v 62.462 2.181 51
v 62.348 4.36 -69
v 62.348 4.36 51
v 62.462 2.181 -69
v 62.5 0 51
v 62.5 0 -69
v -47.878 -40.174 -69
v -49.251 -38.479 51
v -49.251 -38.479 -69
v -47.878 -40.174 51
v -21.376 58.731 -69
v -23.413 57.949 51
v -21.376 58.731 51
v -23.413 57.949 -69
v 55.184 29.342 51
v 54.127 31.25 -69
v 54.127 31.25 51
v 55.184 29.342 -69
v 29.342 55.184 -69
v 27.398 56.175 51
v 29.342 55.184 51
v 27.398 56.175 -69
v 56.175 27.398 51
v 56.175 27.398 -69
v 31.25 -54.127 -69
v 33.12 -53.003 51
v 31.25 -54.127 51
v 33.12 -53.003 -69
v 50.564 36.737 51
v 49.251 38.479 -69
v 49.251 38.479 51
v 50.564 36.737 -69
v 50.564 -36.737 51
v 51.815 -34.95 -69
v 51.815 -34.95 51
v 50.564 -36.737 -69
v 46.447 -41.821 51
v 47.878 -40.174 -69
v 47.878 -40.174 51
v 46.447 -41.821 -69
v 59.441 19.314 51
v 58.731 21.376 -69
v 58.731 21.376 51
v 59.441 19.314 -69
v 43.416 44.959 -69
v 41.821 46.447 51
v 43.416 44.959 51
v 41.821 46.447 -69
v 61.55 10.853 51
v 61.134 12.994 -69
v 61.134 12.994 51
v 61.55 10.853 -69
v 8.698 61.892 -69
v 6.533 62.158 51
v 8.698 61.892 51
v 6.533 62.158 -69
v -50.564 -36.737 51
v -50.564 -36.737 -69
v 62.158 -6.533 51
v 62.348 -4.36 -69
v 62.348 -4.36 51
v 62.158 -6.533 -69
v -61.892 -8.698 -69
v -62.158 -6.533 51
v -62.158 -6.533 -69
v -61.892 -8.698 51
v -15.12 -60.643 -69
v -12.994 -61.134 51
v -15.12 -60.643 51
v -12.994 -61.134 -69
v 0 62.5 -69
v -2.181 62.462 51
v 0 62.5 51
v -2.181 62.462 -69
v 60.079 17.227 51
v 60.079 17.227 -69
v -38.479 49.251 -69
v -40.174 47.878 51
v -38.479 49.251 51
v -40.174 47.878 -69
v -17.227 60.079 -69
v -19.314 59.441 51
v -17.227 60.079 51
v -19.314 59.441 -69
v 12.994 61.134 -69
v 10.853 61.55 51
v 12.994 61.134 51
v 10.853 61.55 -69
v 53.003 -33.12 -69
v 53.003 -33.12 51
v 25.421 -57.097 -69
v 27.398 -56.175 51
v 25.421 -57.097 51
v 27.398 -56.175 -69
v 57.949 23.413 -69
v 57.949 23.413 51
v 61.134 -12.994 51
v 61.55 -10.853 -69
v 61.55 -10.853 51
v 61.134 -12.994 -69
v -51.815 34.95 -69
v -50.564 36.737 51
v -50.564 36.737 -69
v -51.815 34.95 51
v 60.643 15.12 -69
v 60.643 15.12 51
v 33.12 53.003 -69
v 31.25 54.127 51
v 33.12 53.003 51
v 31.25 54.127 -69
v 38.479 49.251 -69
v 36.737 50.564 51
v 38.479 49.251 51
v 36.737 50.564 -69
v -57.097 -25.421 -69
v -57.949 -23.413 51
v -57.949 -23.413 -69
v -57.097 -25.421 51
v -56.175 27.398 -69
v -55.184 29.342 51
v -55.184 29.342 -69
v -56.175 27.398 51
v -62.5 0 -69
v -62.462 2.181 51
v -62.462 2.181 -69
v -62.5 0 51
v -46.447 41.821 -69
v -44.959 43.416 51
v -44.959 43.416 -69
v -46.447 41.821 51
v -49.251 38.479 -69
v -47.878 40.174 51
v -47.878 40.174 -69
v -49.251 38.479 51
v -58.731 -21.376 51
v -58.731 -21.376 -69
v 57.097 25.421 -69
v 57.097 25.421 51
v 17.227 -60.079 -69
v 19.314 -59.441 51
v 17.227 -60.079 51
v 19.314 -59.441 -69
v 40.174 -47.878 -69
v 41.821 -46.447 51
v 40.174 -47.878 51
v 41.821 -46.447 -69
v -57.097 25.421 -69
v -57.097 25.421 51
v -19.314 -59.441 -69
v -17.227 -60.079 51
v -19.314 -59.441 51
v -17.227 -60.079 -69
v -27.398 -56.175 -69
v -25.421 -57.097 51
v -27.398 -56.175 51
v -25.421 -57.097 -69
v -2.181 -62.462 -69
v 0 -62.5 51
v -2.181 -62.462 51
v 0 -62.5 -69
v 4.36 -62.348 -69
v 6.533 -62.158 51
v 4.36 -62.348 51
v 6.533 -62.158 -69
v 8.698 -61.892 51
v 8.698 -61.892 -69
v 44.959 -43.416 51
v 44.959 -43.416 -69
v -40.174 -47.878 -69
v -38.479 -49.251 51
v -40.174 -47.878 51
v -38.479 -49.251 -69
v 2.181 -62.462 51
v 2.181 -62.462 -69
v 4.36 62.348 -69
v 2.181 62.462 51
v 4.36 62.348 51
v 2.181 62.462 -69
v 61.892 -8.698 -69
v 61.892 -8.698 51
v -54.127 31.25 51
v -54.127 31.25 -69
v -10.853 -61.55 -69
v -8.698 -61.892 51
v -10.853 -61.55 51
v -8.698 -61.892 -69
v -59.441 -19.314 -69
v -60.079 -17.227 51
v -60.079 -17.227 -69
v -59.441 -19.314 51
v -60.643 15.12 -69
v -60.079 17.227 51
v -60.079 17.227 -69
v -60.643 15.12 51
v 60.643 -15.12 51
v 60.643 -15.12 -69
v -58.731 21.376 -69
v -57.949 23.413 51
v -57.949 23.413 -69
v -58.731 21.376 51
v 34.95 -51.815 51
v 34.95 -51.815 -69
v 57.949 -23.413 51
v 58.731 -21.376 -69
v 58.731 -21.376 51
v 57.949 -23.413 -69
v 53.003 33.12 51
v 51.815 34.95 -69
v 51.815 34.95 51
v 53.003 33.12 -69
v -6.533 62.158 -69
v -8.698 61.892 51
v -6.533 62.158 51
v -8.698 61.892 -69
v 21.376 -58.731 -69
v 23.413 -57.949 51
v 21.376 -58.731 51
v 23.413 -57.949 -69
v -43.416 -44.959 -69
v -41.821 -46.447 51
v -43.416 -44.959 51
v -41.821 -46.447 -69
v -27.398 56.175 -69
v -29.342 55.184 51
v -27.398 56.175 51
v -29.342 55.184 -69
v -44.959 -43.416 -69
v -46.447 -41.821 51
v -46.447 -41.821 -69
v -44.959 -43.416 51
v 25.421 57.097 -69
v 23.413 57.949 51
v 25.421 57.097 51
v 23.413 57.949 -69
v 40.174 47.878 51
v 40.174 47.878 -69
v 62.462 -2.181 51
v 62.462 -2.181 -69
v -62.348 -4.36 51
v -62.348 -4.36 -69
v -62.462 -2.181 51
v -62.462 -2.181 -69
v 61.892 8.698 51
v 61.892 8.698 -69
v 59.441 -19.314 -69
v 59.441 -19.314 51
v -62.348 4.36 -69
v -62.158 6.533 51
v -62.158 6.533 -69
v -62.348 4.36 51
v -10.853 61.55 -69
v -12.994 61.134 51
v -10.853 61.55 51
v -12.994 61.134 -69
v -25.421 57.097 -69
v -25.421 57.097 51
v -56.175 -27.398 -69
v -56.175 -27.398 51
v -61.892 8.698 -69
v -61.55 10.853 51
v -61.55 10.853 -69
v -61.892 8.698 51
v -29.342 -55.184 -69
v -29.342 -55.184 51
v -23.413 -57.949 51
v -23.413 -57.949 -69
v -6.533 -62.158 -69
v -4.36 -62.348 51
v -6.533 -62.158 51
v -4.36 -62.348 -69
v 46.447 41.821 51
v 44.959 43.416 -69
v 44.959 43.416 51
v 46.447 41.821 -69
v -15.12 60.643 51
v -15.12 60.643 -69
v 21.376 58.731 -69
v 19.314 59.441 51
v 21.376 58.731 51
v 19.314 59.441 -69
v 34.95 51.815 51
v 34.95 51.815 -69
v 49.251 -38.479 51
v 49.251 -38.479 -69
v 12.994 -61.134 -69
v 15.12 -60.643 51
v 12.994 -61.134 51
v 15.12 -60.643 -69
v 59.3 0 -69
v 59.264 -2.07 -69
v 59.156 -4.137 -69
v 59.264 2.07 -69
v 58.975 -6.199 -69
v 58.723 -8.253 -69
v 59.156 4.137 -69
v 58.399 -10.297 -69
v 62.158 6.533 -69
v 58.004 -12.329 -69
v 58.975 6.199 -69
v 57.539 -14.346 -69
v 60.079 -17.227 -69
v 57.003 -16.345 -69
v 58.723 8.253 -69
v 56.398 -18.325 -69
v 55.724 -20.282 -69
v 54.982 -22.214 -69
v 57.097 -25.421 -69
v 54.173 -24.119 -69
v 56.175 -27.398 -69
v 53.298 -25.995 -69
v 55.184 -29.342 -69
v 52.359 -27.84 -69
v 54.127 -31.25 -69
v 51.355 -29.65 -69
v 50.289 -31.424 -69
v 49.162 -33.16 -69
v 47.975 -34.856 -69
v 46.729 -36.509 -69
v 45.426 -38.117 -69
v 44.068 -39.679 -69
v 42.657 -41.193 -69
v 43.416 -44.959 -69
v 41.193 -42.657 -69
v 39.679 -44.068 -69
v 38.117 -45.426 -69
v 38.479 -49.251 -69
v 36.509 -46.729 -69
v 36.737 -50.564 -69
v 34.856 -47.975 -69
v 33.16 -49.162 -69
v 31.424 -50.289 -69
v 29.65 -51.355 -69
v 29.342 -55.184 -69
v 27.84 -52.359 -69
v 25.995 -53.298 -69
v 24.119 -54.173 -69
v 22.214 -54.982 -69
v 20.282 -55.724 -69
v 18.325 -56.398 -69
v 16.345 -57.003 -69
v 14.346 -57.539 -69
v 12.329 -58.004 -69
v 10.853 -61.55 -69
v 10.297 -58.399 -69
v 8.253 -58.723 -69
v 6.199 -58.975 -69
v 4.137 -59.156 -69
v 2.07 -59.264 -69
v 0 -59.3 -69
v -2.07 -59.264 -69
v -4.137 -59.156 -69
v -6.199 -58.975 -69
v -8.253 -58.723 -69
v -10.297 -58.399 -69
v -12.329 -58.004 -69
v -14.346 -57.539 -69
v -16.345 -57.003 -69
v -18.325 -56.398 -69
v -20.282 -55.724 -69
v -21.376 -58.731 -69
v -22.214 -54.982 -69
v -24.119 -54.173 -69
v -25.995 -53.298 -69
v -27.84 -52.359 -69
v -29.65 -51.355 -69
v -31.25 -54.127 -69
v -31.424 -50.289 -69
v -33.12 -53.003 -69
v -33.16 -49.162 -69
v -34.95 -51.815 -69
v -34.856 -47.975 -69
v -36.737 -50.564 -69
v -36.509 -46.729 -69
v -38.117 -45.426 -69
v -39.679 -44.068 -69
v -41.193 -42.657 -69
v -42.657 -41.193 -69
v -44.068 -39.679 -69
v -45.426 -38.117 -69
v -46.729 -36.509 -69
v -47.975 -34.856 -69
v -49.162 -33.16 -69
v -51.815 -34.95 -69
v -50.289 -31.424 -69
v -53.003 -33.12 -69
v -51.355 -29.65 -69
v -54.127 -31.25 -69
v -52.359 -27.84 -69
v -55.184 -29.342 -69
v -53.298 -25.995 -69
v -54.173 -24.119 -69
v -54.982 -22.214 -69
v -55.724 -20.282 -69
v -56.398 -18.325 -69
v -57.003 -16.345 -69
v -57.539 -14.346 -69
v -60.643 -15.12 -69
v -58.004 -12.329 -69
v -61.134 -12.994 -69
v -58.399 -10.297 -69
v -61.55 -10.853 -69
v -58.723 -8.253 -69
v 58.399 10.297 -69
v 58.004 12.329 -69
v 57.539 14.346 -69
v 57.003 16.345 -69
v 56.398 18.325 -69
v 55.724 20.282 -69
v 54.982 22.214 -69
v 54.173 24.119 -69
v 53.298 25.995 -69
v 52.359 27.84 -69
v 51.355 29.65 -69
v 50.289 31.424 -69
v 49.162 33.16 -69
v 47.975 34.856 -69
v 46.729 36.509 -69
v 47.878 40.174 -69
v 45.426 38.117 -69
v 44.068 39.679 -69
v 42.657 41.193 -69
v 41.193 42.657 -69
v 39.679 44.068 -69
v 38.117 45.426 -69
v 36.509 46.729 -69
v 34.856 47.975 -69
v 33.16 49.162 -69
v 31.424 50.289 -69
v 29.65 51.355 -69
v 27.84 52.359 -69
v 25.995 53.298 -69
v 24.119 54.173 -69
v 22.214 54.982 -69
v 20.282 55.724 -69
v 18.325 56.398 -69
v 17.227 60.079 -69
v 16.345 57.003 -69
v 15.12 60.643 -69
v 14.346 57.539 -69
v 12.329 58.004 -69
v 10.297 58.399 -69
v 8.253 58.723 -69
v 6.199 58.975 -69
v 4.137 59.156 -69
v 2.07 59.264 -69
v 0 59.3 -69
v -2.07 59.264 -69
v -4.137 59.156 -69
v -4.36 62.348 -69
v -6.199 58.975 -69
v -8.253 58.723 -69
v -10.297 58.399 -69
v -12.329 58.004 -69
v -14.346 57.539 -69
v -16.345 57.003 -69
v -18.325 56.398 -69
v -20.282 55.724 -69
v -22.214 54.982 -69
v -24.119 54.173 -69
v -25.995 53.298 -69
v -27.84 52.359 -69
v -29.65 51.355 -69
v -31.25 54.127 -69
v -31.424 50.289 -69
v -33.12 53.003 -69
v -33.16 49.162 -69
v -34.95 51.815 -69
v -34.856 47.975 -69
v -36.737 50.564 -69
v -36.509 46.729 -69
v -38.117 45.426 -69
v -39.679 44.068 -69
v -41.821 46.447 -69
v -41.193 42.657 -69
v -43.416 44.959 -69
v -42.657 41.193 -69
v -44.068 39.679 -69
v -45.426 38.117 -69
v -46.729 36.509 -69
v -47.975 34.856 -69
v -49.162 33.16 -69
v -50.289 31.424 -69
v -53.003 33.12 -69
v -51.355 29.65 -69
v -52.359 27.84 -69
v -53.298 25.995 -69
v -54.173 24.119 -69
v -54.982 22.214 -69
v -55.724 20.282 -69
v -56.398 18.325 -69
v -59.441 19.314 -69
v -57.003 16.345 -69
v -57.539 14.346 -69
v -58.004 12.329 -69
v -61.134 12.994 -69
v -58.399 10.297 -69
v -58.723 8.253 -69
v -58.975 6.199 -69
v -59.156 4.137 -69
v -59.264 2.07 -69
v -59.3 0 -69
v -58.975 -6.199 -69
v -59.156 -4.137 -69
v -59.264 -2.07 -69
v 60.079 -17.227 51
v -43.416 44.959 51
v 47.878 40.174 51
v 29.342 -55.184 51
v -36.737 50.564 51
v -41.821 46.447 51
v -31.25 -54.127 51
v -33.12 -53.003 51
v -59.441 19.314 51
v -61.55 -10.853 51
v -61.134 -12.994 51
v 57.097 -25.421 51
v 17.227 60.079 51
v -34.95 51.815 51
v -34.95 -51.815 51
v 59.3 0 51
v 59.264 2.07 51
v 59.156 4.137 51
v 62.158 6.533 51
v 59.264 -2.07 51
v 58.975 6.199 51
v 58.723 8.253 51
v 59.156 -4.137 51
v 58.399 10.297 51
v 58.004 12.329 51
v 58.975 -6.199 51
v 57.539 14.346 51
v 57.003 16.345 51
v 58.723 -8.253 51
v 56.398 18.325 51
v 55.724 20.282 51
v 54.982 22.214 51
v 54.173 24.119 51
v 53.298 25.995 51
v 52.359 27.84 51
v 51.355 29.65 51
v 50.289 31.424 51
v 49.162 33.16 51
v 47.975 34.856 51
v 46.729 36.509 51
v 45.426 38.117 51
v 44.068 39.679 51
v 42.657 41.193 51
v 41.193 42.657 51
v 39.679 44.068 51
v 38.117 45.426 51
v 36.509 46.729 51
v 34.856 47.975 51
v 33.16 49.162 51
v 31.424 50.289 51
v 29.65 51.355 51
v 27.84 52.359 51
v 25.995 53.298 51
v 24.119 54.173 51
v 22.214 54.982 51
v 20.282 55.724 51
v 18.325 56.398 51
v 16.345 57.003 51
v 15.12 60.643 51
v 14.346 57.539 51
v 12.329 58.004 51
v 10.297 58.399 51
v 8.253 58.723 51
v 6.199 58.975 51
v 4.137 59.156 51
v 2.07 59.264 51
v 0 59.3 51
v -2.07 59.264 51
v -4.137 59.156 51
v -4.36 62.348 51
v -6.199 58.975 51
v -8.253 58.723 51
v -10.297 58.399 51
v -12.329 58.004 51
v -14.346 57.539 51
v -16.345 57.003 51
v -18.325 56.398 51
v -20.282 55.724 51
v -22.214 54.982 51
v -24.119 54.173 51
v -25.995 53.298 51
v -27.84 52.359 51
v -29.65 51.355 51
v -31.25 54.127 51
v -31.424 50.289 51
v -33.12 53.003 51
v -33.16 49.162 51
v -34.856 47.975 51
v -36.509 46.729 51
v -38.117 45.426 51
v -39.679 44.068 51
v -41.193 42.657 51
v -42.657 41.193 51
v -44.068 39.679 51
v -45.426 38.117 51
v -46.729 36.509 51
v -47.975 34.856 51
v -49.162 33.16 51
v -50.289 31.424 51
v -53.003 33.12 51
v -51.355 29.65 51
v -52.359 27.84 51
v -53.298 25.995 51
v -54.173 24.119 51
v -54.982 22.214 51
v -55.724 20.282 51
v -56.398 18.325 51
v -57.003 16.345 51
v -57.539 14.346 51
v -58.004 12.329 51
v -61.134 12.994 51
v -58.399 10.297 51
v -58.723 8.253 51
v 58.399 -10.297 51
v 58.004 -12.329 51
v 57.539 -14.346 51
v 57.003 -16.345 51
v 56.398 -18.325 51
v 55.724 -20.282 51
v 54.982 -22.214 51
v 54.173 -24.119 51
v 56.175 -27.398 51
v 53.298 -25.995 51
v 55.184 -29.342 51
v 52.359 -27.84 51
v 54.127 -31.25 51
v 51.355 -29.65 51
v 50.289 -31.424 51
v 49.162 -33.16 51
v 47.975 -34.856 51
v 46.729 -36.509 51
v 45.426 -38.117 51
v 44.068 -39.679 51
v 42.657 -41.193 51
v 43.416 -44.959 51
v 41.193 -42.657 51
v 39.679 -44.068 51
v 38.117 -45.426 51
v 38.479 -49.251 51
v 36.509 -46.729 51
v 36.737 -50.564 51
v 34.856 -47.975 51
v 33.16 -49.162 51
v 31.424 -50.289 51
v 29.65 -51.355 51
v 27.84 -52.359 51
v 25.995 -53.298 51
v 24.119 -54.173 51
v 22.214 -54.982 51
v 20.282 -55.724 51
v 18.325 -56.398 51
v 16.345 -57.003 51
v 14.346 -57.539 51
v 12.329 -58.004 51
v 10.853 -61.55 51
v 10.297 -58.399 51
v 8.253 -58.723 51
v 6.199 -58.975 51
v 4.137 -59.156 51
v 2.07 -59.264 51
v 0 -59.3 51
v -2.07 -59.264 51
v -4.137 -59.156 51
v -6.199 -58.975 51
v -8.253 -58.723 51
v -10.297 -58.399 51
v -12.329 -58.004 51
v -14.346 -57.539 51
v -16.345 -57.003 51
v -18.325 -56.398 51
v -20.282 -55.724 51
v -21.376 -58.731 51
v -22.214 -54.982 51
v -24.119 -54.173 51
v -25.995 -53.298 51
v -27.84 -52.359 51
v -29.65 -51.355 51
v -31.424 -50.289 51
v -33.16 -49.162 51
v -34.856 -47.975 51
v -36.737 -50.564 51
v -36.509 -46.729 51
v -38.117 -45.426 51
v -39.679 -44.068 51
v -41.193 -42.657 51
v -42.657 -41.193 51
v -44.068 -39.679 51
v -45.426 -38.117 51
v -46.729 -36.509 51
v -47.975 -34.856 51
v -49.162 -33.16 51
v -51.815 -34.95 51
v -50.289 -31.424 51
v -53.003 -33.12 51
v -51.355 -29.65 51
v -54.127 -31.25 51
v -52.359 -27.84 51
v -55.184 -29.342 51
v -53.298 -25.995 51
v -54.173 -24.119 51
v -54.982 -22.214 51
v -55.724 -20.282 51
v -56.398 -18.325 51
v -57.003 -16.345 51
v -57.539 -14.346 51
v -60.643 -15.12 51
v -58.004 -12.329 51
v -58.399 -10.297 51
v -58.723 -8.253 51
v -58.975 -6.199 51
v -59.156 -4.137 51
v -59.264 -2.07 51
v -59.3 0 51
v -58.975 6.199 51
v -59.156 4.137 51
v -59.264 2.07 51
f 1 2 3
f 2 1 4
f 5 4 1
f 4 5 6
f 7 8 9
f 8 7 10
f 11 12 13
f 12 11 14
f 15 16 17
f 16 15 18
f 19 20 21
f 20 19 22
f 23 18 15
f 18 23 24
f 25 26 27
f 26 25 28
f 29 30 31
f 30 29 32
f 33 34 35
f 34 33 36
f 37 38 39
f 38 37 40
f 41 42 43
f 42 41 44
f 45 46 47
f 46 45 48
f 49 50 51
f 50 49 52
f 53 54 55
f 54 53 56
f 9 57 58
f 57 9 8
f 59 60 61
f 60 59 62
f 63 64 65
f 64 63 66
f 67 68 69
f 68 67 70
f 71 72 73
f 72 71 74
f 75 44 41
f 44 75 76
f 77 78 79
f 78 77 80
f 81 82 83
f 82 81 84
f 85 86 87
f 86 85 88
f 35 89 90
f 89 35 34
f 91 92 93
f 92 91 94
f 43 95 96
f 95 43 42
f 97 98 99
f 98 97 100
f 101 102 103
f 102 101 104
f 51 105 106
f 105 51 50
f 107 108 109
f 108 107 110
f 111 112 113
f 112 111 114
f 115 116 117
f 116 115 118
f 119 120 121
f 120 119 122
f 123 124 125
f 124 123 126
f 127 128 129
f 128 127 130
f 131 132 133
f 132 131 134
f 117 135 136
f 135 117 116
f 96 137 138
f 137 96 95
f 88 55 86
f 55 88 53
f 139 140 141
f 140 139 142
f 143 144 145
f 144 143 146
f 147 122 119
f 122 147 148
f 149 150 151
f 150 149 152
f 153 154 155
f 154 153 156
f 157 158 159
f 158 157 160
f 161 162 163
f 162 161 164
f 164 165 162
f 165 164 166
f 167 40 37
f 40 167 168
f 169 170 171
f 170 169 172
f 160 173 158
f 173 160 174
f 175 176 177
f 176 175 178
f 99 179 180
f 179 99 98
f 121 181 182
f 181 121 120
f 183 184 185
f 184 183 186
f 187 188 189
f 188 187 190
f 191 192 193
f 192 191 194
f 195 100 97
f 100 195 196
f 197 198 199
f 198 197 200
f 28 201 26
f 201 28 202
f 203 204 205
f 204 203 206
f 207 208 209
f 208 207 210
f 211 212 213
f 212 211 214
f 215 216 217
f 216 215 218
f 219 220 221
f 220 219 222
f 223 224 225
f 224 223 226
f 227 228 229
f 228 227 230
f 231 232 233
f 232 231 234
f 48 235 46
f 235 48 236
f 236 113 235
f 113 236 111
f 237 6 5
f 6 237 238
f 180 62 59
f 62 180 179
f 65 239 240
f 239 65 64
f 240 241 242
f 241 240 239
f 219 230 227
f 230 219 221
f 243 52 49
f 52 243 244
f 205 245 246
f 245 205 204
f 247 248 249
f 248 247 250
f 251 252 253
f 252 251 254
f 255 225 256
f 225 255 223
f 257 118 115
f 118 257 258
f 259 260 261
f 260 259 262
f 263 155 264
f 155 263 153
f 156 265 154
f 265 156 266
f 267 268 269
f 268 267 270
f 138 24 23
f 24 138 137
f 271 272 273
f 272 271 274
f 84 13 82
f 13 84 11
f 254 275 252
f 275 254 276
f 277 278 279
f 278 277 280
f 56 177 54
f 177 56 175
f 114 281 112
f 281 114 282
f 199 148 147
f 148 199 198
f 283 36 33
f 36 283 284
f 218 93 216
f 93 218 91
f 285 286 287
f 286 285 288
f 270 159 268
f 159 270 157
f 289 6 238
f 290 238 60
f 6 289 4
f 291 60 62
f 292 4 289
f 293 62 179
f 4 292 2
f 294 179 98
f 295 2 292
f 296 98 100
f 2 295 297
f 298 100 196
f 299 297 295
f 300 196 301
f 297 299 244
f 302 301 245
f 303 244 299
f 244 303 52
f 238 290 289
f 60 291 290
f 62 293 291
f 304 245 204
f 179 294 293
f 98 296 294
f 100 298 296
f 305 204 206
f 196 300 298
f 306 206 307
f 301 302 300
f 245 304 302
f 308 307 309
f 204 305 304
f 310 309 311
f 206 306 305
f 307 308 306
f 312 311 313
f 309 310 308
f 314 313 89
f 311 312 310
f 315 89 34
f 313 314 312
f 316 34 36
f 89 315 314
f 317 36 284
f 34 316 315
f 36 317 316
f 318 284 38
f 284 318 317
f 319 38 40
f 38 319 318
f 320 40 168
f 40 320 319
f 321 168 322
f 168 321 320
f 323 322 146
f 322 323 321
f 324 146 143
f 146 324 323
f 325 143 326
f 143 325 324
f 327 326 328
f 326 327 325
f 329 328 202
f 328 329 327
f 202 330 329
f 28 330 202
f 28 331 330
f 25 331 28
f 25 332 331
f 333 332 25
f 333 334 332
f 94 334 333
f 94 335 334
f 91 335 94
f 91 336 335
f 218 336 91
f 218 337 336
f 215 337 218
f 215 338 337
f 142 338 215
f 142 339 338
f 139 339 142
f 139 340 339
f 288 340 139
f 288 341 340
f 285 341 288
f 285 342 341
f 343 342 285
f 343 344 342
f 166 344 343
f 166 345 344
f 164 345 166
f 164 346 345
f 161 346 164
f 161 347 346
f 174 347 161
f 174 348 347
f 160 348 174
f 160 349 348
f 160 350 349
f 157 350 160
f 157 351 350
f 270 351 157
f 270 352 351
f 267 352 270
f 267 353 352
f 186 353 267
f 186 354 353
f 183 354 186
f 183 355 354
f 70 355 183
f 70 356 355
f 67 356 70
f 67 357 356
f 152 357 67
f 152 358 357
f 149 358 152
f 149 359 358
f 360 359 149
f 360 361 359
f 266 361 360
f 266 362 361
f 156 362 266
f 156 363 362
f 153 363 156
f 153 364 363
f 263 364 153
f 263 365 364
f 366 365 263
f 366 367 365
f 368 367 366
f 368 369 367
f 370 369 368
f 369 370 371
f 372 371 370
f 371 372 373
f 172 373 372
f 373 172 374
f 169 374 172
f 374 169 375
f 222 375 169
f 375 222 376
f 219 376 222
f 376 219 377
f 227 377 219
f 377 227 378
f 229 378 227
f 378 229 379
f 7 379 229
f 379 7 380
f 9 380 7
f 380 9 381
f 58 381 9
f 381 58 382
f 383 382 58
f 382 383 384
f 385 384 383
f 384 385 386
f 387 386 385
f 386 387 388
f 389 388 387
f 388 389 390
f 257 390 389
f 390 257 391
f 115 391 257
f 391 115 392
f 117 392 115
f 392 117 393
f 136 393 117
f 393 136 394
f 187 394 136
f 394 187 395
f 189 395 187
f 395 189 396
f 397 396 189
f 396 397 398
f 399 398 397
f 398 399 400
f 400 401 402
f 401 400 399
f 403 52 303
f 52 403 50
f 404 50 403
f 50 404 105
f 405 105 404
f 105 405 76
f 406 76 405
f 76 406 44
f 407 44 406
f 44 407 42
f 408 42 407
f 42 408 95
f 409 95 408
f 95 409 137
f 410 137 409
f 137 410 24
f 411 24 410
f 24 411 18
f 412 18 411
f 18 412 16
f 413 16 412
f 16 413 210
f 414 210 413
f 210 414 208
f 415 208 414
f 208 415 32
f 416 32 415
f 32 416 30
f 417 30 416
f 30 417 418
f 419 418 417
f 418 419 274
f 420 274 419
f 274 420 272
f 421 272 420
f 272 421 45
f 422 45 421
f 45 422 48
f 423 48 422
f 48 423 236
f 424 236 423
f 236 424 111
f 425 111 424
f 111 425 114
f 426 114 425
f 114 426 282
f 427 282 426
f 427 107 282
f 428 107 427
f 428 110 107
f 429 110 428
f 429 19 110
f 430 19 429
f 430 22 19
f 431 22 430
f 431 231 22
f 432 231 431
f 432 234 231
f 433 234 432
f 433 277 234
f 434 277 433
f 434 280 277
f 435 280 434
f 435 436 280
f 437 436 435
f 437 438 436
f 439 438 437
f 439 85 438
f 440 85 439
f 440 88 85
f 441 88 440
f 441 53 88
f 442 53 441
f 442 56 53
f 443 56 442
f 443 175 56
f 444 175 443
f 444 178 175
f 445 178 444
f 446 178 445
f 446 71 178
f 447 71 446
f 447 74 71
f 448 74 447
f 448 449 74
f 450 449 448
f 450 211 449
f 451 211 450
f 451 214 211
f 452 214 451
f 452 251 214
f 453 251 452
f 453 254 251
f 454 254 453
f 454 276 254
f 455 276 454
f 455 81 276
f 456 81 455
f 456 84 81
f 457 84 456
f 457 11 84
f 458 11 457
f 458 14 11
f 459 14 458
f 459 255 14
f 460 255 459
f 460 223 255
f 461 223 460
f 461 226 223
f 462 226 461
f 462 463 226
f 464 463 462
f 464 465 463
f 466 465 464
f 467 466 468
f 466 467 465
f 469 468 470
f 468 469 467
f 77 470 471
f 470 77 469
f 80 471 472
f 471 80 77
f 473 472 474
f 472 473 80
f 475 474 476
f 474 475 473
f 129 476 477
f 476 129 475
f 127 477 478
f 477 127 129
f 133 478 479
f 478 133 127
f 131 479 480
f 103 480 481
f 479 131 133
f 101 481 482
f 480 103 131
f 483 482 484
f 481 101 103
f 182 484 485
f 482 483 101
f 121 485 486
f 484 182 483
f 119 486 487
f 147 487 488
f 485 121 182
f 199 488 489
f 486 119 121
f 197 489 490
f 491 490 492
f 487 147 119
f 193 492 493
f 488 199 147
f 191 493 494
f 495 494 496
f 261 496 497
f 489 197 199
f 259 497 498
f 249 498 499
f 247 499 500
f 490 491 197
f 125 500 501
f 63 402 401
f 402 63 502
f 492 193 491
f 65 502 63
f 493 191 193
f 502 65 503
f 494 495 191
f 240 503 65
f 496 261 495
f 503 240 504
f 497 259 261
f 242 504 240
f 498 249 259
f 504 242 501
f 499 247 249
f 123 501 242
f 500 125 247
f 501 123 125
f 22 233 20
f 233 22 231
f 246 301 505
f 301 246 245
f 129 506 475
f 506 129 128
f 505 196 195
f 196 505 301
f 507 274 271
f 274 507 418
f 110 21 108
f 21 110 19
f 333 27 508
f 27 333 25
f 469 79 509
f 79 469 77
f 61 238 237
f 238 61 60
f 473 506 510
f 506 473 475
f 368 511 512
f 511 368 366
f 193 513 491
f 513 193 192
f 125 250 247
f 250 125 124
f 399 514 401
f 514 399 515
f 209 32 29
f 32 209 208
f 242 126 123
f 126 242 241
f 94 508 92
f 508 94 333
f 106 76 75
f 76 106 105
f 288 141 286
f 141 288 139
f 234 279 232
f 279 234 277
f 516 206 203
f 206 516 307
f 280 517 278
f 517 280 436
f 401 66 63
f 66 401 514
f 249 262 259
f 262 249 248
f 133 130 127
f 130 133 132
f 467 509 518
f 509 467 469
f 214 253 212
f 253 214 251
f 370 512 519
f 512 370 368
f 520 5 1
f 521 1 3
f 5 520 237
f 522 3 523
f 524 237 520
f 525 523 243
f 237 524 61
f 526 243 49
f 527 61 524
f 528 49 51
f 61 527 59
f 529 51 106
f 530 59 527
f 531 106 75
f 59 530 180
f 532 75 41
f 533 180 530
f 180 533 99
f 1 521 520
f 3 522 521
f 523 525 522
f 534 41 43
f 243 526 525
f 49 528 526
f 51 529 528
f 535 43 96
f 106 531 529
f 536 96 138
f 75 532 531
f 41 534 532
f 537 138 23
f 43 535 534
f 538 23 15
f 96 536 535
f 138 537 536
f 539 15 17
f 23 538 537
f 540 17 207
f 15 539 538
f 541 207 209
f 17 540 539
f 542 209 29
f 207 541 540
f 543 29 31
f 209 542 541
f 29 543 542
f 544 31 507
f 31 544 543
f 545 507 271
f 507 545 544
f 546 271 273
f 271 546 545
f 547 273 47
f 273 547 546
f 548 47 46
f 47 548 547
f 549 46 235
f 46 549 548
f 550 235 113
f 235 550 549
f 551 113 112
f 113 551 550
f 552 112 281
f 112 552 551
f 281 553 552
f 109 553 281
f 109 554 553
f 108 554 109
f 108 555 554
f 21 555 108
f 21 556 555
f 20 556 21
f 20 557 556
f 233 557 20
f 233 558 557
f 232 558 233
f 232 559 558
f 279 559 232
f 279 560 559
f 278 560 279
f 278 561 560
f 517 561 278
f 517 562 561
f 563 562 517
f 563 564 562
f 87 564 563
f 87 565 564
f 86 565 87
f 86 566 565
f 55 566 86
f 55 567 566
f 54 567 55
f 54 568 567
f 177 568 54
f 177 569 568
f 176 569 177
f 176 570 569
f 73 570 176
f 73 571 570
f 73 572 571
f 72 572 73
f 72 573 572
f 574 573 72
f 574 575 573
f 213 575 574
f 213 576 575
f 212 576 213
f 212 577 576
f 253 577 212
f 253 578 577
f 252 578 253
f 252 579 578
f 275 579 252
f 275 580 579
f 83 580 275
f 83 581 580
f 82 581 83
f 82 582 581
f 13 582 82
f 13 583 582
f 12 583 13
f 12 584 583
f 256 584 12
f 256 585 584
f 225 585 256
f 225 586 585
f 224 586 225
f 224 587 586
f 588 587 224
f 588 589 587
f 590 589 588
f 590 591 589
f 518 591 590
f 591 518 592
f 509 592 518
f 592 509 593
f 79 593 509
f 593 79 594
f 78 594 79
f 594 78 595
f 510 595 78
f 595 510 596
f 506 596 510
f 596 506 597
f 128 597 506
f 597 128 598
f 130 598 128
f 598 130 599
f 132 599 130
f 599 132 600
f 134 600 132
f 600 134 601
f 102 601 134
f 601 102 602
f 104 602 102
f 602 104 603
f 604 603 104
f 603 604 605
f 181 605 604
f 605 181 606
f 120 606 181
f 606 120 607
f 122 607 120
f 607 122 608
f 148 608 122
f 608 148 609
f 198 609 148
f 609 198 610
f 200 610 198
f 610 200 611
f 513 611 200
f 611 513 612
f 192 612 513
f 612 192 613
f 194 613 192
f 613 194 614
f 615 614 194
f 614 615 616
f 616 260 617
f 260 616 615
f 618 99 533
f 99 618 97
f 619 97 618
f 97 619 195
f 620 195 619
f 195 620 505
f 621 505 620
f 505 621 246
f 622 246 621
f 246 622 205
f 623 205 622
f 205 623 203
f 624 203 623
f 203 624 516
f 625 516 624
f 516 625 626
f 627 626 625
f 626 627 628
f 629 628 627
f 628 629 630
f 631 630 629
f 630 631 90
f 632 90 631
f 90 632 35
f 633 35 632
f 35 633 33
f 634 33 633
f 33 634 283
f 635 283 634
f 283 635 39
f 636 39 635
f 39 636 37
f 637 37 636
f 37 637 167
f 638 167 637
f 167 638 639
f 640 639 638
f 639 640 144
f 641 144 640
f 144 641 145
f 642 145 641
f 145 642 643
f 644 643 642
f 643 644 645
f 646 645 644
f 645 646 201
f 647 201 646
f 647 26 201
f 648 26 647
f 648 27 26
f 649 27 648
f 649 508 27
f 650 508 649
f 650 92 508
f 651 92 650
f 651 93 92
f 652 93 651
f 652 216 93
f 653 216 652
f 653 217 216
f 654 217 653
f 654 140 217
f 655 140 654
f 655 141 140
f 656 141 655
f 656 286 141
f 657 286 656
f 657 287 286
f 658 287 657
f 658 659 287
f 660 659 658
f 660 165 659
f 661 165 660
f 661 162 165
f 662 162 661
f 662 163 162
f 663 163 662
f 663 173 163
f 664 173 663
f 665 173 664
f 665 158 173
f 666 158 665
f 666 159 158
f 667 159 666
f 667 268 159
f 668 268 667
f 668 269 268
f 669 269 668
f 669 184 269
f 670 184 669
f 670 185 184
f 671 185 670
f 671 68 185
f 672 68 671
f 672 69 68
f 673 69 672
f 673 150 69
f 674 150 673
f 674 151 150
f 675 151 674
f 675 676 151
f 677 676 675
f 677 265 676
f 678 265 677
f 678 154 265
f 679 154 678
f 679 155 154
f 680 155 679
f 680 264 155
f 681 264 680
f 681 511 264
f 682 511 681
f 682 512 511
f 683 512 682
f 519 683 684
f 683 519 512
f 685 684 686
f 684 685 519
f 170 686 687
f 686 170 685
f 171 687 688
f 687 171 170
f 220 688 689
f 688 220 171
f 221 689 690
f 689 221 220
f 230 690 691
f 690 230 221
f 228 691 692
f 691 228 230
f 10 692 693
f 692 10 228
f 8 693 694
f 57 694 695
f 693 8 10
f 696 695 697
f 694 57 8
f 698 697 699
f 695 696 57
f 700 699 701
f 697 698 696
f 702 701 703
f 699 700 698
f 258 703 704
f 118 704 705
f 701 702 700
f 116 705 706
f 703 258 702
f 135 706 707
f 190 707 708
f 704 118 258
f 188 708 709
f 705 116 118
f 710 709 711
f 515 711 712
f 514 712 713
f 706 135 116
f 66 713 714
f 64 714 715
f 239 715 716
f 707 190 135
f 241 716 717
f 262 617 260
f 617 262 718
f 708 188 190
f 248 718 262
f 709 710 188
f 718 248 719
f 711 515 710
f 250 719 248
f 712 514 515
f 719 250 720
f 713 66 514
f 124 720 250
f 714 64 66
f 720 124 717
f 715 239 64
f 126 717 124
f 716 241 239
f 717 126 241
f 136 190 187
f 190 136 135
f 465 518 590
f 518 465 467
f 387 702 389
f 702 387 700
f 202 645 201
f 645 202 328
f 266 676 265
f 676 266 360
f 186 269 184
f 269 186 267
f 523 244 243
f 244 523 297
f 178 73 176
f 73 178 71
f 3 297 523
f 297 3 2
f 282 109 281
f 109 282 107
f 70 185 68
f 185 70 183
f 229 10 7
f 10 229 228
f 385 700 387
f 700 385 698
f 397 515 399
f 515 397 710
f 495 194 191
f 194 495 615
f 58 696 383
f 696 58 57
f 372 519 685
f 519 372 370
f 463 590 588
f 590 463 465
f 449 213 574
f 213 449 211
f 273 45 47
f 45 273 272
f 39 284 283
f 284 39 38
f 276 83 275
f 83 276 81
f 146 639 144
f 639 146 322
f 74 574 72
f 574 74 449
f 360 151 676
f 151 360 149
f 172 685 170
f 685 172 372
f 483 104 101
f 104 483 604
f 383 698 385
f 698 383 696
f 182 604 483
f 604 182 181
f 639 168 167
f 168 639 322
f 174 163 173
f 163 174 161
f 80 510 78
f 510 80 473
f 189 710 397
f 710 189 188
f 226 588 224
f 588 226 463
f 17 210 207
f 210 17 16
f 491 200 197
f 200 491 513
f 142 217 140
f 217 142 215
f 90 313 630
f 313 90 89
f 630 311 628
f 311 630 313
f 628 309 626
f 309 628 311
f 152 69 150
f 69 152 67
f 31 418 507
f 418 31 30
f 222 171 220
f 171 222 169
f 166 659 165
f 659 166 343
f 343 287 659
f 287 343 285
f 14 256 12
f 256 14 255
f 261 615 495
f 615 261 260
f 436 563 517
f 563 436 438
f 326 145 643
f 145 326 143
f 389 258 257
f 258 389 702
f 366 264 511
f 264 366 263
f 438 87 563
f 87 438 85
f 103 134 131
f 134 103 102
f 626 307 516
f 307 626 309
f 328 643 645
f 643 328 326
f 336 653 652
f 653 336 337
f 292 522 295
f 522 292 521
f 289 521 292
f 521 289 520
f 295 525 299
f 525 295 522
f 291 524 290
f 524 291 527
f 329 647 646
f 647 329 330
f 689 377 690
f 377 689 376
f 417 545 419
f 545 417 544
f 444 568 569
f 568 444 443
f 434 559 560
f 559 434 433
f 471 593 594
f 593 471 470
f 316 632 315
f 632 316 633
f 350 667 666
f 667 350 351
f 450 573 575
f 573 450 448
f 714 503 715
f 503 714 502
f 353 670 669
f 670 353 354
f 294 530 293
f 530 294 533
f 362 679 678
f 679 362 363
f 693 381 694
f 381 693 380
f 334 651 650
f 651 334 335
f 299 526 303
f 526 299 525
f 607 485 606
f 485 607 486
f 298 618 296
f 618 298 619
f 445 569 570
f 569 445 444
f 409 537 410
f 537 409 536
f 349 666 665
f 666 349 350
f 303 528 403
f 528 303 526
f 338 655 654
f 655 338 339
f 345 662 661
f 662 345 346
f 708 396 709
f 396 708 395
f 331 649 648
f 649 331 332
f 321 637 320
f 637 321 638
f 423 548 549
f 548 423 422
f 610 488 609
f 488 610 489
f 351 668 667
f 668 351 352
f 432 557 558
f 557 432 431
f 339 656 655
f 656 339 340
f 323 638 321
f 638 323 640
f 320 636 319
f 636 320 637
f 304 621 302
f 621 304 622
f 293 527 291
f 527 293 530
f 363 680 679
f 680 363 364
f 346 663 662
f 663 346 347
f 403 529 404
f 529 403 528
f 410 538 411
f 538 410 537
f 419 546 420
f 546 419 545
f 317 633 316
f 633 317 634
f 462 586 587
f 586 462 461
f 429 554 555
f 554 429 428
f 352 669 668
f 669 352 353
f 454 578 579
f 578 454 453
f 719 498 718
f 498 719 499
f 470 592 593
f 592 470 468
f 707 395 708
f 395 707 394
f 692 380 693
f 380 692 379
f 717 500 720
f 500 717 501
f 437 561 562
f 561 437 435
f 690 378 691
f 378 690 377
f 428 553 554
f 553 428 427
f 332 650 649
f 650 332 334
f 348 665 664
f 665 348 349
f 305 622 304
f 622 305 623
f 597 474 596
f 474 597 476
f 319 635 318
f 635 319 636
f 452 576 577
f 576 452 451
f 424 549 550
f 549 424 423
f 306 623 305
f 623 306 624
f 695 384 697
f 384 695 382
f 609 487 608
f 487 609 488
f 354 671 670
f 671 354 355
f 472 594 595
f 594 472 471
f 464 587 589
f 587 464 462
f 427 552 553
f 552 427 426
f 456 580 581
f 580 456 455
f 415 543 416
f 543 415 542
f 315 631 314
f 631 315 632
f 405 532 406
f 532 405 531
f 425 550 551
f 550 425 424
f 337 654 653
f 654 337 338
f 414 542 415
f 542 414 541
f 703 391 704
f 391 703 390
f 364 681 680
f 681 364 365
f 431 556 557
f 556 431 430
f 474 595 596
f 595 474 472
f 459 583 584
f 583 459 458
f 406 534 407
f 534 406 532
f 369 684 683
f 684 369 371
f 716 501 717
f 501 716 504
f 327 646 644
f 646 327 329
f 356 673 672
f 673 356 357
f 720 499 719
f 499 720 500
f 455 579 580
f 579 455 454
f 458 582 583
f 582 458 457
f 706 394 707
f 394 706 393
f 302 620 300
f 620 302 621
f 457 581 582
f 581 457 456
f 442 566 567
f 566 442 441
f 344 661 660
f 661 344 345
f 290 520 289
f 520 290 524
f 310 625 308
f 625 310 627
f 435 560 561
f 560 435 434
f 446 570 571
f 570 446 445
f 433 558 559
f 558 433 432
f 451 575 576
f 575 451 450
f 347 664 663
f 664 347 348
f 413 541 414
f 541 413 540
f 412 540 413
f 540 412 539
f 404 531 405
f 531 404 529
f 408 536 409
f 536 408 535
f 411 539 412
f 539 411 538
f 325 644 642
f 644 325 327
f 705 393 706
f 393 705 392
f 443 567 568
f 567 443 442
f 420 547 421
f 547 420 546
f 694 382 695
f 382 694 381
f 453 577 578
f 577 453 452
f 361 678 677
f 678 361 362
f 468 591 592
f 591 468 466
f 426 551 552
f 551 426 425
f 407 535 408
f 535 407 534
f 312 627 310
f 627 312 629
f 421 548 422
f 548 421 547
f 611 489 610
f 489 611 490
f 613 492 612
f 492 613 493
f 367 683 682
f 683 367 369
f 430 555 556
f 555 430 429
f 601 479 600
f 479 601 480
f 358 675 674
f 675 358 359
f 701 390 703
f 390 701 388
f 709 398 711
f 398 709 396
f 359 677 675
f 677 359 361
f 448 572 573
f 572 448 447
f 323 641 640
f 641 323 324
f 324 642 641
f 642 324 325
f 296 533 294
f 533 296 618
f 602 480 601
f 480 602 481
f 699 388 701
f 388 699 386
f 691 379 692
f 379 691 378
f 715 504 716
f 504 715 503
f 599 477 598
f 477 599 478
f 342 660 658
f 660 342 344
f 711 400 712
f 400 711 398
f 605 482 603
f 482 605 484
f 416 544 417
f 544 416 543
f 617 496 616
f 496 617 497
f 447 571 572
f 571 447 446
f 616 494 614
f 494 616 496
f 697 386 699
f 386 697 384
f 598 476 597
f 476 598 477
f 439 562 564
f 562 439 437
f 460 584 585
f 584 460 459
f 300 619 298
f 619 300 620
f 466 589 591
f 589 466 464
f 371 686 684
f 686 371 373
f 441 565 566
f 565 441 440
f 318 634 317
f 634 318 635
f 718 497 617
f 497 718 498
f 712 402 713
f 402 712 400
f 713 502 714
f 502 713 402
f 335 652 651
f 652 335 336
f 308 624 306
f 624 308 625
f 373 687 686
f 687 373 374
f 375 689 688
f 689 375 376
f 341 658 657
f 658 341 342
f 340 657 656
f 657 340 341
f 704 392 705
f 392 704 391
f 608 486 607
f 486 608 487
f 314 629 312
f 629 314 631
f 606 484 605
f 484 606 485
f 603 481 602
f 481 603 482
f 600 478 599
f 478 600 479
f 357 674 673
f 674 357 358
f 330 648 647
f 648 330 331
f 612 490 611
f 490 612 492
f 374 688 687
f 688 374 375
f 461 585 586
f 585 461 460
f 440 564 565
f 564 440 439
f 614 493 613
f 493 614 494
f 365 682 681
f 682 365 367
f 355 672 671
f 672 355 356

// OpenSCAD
$fn = 180;

// Parameters
nominal_diameter = 125; //[60:250:1]
cap_outer_diameter = 125; //[80:200:1]
wall_thickness = 3.2; //[1.6:6.4:0.1]
socket_inner_diameter = 125; //[80:200:1]
socket_depth = 50; //[25:100:1]
end_face_thickness = 4; //[2:10:0.5]
lead_in_chamfer_angle_deg = 30; //[10:60:1]
pipe_wall_thickness = 3.2; //[1.6:6.4:0.1]
pipe_length = 120; //[60:240:1]
overlap = 1; //[0.5:2:0.1]
chamfer_radial = 2; //[1:5:0.1]
outer_chamfer_radial = 1.5; //[0.5:4:0.1]

// Derived
cap_r      = cap_outer_diameter/2;
socket_r   = socket_inner_diameter/2;
pipe_od_r  = socket_r; // pipe OD matches socket ID for assembly
pipe_id_r  = pipe_od_r - pipe_wall_thickness;

cap_total_h = socket_depth + end_face_thickness;

// Chamfer height from angle (avoid div by 0)
function chamfer_h(radial, ang_deg) = radial / max(0.001, tan(ang_deg * PI / 180));

module ht125_cap_with_pipe() {
  color([0.85, 0.85, 0.8])
  union() {

    // CAP: closed end + socket (open at bottom)
    difference() {
      // Outer body
      cylinder(r=cap_r, h=cap_total_h, center=false);

      // Inner cavity: stop before the closed end to ensure a solid end face
      translate([0,0,-overlap])
        cylinder(r=socket_r, h=socket_depth + overlap, center=false);

      // Lead-in chamfer at socket mouth (bottom)
      translate([0,0,-overlap])
        cylinder(
          r1 = socket_r + chamfer_radial,
          r2 = socket_r,
          h  = chamfer_h(chamfer_radial, lead_in_chamfer_angle_deg) + overlap,
          center=false
        );

      // Outer chamfer at the closed-end rim (top)
      translate([0,0,cap_total_h - outer_chamfer_radial])
        cylinder(
          r1 = cap_r + outer_chamfer_radial,
          r2 = cap_r,
          h  = outer_chamfer_radial + overlap,
          center=false
        );
    }

    // PIPE: inserted into socket and connected (overlaps into cap by 'overlap')
    // Pipe top ends at z = socket_depth + overlap, which is inside the cap solid region.
    translate([0,0,-pipe_length + socket_depth + overlap])
      difference() {
        cylinder(r=pipe_od_r, h=pipe_length, center=false);
        translate([0,0,-overlap])
          cylinder(r=pipe_id_r, h=pipe_length + 2*overlap, center=false);
      }
  }
}

ht125_cap_with_pipe();
